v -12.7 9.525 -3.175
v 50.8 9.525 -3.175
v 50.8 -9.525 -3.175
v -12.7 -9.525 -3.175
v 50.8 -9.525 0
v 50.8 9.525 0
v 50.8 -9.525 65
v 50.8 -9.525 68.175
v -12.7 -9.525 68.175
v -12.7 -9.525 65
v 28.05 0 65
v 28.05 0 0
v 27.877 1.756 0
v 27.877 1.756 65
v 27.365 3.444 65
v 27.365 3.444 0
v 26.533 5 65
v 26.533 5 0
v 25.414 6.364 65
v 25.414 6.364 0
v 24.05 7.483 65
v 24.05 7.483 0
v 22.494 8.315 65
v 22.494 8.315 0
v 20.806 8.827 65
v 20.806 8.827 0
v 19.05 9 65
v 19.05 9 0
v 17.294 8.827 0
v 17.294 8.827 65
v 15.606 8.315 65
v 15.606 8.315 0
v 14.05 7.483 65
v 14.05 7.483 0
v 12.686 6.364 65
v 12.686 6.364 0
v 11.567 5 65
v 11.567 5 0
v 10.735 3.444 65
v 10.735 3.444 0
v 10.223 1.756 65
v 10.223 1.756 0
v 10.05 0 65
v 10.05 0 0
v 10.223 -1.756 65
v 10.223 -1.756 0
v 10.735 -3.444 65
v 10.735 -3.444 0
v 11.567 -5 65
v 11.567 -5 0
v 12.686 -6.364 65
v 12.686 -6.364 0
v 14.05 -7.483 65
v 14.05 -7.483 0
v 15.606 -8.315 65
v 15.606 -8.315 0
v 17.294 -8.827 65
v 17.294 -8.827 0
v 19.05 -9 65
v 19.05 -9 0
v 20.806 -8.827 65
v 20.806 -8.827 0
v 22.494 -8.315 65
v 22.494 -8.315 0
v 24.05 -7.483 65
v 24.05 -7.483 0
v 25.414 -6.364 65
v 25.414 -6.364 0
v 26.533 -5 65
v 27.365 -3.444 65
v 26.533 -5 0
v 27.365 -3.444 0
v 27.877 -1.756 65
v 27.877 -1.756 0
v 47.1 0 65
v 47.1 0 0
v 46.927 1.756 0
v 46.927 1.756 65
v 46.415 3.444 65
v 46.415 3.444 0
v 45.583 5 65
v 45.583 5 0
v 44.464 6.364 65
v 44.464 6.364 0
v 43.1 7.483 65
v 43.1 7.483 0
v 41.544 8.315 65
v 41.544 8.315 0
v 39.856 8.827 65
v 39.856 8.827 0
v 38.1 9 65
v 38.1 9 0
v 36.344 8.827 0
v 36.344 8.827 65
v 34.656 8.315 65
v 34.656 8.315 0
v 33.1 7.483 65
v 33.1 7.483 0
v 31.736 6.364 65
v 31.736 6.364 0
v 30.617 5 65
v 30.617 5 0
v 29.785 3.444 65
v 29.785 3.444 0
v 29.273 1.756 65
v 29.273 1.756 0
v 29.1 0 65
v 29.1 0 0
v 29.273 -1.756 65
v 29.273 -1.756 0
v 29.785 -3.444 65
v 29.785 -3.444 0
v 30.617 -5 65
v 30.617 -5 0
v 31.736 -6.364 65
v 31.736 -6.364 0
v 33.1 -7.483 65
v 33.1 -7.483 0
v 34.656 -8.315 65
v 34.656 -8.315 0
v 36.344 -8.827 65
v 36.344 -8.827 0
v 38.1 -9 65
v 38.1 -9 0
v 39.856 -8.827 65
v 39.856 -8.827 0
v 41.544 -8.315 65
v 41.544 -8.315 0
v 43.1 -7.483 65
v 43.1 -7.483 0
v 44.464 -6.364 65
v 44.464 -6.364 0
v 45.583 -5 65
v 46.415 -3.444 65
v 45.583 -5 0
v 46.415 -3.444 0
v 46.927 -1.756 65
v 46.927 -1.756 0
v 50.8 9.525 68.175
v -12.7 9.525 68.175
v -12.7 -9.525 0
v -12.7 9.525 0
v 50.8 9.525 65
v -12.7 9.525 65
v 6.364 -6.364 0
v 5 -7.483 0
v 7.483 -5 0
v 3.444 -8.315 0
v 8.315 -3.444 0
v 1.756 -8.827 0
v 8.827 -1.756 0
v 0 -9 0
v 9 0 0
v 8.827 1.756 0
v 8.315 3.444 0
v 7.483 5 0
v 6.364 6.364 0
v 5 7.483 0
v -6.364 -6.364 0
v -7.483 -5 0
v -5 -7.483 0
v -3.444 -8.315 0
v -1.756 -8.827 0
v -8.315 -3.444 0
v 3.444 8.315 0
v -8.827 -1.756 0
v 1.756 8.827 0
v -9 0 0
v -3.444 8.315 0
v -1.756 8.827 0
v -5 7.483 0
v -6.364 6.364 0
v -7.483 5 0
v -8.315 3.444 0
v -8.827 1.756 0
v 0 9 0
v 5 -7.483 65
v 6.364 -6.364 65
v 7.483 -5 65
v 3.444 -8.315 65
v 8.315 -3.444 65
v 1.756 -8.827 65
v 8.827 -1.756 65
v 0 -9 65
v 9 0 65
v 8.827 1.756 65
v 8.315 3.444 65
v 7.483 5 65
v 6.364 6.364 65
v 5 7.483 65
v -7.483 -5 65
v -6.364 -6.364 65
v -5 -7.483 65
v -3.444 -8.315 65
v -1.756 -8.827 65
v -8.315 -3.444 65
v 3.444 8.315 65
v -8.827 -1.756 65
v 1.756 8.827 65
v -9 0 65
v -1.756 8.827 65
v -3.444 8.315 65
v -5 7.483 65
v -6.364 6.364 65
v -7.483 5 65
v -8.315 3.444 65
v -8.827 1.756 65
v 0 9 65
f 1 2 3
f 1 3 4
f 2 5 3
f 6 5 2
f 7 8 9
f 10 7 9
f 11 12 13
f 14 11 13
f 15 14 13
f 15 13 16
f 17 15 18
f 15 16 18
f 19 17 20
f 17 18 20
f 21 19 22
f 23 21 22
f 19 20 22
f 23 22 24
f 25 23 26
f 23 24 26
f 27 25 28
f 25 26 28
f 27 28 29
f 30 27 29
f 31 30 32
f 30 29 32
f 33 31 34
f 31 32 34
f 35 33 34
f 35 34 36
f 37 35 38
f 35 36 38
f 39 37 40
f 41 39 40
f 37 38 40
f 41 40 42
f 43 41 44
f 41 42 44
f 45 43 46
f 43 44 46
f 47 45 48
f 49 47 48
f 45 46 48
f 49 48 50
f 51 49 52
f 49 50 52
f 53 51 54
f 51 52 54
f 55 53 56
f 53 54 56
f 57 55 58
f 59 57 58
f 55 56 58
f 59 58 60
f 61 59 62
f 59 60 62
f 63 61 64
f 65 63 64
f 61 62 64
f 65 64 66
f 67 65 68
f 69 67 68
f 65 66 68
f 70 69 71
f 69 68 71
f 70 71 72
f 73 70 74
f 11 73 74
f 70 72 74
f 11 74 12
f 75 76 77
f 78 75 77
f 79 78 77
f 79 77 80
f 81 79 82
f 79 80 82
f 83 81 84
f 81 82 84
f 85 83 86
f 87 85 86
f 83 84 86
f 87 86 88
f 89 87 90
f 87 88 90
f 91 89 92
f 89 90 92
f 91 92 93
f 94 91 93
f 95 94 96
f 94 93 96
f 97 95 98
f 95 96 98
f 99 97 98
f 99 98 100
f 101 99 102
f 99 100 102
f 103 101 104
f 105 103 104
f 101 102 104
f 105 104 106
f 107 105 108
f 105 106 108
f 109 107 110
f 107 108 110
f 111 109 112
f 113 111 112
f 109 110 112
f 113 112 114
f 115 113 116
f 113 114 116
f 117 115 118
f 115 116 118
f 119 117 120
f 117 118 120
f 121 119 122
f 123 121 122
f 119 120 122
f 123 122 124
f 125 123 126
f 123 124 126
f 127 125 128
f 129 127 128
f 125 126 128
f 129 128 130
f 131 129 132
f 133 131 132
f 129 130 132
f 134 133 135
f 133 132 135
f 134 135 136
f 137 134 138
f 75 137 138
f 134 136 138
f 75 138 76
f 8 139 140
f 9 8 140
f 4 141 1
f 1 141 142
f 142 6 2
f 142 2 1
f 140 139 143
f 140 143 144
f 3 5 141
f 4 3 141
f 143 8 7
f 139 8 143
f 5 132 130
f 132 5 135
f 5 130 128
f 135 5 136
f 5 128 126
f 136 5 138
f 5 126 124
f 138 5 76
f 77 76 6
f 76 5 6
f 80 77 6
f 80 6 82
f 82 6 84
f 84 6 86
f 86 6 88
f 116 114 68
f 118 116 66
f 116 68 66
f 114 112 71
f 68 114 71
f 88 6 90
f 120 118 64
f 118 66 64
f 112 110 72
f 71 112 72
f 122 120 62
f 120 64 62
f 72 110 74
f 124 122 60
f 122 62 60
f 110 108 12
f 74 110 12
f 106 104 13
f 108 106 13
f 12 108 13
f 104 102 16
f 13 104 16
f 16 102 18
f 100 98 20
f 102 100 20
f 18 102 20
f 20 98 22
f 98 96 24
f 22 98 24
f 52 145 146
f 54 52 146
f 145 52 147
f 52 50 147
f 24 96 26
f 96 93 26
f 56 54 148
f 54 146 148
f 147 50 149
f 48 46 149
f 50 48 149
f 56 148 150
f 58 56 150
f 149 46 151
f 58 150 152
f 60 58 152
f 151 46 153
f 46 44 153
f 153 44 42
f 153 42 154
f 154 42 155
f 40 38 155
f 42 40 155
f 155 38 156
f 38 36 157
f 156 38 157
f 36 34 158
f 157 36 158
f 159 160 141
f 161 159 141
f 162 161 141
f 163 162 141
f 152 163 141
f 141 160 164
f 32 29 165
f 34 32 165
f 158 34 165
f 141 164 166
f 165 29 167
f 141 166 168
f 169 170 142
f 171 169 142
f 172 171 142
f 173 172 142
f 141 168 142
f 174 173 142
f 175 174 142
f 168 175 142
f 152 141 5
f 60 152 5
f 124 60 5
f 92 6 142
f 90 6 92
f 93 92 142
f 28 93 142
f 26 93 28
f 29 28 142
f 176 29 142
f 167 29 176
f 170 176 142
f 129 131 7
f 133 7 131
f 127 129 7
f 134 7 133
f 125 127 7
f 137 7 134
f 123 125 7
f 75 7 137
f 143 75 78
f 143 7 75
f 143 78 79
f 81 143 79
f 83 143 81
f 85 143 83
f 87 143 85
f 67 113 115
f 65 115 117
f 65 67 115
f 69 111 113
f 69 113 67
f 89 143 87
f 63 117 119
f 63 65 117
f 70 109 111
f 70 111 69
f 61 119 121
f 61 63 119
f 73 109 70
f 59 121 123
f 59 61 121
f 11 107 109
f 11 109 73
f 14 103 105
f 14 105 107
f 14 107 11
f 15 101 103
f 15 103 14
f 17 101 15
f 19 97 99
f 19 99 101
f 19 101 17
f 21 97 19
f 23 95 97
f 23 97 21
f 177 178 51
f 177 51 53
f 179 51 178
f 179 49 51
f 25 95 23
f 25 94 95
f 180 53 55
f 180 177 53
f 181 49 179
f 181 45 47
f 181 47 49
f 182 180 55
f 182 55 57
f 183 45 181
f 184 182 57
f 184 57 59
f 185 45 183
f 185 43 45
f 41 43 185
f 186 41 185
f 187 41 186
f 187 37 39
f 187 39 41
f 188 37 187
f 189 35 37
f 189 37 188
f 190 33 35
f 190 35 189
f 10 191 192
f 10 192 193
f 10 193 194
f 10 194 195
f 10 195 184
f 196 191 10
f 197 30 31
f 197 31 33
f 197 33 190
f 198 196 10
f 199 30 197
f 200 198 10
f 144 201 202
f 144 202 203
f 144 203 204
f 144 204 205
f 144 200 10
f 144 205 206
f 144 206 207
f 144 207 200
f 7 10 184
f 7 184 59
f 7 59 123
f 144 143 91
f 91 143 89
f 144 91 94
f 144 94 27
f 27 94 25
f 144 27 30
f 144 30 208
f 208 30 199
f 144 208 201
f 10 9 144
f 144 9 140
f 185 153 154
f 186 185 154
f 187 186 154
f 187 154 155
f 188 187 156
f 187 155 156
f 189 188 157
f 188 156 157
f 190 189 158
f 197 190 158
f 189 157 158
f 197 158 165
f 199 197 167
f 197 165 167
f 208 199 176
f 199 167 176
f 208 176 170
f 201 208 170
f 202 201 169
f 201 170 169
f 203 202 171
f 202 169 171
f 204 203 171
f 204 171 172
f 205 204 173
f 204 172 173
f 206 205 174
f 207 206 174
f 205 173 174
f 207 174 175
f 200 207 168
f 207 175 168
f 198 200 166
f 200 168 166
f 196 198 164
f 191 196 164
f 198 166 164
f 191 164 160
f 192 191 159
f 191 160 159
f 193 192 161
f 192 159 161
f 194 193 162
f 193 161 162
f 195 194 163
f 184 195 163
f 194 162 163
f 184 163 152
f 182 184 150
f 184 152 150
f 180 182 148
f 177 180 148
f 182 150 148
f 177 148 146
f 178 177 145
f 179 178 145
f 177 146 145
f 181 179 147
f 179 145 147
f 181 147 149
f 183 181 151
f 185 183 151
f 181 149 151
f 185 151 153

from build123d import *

# Parameters (mm, degrees)
SKETCH1_R           = 9
BOSS_EXTRUDE1_DEPTH = 65
LPATTERN1_COUNT     = 3
LPATTERN1_PITCH     = 19.05
SKETCH2_W           = 63.5
SKETCH2_H           = 19.05
BOSS_EXTRUDE5_DEPTH = 3.175
LPATTERN2_COUNT     = 2
LPATTERN2_PITCH     = 68.175


with BuildPart() as part:
    # Sketch1 → Boss-Extrude1 (new body)
    with BuildSketch(Plane.XY):
        Circle(SKETCH1_R)
    extrude(amount=BOSS_EXTRUDE1_DEPTH)


with BuildPart() as lpattern1_1:
    # LPattern1: pattern copy
    add(part.part.moved(Location(Vector(1, 0, 0) * (1 * LPATTERN1_PITCH))))


with BuildPart() as lpattern1_2:
    # LPattern1: pattern copy
    add(part.part.moved(Location(Vector(1, 0, 0) * (2 * LPATTERN1_PITCH))))


with BuildPart() as part_1:
    add(part.part)

    add(lpattern1_1.part)  # Boss-Extrude5 merges LPattern1_1

    add(lpattern1_2.part)  # Boss-Extrude5 merges LPattern1_2
    # Sketch2 → Boss-Extrude5 (add)
    with BuildSketch(Plane(origin=(0, 0, 0), x_dir=(-1, 0, 0), z_dir=(0, 0, -1))):
        with Locations((-19.05, 0)):
            Rectangle(SKETCH2_W, SKETCH2_H)
    boss_extrude5 = extrude(amount=BOSS_EXTRUDE5_DEPTH)

    # LPattern2: Boss-Extrude5 ×2
    with Locations(*[(0, 0, i * LPATTERN2_PITCH) for i in range(1, LPATTERN2_COUNT)]):
        add(boss_extrude5)


solid = part_1.part
